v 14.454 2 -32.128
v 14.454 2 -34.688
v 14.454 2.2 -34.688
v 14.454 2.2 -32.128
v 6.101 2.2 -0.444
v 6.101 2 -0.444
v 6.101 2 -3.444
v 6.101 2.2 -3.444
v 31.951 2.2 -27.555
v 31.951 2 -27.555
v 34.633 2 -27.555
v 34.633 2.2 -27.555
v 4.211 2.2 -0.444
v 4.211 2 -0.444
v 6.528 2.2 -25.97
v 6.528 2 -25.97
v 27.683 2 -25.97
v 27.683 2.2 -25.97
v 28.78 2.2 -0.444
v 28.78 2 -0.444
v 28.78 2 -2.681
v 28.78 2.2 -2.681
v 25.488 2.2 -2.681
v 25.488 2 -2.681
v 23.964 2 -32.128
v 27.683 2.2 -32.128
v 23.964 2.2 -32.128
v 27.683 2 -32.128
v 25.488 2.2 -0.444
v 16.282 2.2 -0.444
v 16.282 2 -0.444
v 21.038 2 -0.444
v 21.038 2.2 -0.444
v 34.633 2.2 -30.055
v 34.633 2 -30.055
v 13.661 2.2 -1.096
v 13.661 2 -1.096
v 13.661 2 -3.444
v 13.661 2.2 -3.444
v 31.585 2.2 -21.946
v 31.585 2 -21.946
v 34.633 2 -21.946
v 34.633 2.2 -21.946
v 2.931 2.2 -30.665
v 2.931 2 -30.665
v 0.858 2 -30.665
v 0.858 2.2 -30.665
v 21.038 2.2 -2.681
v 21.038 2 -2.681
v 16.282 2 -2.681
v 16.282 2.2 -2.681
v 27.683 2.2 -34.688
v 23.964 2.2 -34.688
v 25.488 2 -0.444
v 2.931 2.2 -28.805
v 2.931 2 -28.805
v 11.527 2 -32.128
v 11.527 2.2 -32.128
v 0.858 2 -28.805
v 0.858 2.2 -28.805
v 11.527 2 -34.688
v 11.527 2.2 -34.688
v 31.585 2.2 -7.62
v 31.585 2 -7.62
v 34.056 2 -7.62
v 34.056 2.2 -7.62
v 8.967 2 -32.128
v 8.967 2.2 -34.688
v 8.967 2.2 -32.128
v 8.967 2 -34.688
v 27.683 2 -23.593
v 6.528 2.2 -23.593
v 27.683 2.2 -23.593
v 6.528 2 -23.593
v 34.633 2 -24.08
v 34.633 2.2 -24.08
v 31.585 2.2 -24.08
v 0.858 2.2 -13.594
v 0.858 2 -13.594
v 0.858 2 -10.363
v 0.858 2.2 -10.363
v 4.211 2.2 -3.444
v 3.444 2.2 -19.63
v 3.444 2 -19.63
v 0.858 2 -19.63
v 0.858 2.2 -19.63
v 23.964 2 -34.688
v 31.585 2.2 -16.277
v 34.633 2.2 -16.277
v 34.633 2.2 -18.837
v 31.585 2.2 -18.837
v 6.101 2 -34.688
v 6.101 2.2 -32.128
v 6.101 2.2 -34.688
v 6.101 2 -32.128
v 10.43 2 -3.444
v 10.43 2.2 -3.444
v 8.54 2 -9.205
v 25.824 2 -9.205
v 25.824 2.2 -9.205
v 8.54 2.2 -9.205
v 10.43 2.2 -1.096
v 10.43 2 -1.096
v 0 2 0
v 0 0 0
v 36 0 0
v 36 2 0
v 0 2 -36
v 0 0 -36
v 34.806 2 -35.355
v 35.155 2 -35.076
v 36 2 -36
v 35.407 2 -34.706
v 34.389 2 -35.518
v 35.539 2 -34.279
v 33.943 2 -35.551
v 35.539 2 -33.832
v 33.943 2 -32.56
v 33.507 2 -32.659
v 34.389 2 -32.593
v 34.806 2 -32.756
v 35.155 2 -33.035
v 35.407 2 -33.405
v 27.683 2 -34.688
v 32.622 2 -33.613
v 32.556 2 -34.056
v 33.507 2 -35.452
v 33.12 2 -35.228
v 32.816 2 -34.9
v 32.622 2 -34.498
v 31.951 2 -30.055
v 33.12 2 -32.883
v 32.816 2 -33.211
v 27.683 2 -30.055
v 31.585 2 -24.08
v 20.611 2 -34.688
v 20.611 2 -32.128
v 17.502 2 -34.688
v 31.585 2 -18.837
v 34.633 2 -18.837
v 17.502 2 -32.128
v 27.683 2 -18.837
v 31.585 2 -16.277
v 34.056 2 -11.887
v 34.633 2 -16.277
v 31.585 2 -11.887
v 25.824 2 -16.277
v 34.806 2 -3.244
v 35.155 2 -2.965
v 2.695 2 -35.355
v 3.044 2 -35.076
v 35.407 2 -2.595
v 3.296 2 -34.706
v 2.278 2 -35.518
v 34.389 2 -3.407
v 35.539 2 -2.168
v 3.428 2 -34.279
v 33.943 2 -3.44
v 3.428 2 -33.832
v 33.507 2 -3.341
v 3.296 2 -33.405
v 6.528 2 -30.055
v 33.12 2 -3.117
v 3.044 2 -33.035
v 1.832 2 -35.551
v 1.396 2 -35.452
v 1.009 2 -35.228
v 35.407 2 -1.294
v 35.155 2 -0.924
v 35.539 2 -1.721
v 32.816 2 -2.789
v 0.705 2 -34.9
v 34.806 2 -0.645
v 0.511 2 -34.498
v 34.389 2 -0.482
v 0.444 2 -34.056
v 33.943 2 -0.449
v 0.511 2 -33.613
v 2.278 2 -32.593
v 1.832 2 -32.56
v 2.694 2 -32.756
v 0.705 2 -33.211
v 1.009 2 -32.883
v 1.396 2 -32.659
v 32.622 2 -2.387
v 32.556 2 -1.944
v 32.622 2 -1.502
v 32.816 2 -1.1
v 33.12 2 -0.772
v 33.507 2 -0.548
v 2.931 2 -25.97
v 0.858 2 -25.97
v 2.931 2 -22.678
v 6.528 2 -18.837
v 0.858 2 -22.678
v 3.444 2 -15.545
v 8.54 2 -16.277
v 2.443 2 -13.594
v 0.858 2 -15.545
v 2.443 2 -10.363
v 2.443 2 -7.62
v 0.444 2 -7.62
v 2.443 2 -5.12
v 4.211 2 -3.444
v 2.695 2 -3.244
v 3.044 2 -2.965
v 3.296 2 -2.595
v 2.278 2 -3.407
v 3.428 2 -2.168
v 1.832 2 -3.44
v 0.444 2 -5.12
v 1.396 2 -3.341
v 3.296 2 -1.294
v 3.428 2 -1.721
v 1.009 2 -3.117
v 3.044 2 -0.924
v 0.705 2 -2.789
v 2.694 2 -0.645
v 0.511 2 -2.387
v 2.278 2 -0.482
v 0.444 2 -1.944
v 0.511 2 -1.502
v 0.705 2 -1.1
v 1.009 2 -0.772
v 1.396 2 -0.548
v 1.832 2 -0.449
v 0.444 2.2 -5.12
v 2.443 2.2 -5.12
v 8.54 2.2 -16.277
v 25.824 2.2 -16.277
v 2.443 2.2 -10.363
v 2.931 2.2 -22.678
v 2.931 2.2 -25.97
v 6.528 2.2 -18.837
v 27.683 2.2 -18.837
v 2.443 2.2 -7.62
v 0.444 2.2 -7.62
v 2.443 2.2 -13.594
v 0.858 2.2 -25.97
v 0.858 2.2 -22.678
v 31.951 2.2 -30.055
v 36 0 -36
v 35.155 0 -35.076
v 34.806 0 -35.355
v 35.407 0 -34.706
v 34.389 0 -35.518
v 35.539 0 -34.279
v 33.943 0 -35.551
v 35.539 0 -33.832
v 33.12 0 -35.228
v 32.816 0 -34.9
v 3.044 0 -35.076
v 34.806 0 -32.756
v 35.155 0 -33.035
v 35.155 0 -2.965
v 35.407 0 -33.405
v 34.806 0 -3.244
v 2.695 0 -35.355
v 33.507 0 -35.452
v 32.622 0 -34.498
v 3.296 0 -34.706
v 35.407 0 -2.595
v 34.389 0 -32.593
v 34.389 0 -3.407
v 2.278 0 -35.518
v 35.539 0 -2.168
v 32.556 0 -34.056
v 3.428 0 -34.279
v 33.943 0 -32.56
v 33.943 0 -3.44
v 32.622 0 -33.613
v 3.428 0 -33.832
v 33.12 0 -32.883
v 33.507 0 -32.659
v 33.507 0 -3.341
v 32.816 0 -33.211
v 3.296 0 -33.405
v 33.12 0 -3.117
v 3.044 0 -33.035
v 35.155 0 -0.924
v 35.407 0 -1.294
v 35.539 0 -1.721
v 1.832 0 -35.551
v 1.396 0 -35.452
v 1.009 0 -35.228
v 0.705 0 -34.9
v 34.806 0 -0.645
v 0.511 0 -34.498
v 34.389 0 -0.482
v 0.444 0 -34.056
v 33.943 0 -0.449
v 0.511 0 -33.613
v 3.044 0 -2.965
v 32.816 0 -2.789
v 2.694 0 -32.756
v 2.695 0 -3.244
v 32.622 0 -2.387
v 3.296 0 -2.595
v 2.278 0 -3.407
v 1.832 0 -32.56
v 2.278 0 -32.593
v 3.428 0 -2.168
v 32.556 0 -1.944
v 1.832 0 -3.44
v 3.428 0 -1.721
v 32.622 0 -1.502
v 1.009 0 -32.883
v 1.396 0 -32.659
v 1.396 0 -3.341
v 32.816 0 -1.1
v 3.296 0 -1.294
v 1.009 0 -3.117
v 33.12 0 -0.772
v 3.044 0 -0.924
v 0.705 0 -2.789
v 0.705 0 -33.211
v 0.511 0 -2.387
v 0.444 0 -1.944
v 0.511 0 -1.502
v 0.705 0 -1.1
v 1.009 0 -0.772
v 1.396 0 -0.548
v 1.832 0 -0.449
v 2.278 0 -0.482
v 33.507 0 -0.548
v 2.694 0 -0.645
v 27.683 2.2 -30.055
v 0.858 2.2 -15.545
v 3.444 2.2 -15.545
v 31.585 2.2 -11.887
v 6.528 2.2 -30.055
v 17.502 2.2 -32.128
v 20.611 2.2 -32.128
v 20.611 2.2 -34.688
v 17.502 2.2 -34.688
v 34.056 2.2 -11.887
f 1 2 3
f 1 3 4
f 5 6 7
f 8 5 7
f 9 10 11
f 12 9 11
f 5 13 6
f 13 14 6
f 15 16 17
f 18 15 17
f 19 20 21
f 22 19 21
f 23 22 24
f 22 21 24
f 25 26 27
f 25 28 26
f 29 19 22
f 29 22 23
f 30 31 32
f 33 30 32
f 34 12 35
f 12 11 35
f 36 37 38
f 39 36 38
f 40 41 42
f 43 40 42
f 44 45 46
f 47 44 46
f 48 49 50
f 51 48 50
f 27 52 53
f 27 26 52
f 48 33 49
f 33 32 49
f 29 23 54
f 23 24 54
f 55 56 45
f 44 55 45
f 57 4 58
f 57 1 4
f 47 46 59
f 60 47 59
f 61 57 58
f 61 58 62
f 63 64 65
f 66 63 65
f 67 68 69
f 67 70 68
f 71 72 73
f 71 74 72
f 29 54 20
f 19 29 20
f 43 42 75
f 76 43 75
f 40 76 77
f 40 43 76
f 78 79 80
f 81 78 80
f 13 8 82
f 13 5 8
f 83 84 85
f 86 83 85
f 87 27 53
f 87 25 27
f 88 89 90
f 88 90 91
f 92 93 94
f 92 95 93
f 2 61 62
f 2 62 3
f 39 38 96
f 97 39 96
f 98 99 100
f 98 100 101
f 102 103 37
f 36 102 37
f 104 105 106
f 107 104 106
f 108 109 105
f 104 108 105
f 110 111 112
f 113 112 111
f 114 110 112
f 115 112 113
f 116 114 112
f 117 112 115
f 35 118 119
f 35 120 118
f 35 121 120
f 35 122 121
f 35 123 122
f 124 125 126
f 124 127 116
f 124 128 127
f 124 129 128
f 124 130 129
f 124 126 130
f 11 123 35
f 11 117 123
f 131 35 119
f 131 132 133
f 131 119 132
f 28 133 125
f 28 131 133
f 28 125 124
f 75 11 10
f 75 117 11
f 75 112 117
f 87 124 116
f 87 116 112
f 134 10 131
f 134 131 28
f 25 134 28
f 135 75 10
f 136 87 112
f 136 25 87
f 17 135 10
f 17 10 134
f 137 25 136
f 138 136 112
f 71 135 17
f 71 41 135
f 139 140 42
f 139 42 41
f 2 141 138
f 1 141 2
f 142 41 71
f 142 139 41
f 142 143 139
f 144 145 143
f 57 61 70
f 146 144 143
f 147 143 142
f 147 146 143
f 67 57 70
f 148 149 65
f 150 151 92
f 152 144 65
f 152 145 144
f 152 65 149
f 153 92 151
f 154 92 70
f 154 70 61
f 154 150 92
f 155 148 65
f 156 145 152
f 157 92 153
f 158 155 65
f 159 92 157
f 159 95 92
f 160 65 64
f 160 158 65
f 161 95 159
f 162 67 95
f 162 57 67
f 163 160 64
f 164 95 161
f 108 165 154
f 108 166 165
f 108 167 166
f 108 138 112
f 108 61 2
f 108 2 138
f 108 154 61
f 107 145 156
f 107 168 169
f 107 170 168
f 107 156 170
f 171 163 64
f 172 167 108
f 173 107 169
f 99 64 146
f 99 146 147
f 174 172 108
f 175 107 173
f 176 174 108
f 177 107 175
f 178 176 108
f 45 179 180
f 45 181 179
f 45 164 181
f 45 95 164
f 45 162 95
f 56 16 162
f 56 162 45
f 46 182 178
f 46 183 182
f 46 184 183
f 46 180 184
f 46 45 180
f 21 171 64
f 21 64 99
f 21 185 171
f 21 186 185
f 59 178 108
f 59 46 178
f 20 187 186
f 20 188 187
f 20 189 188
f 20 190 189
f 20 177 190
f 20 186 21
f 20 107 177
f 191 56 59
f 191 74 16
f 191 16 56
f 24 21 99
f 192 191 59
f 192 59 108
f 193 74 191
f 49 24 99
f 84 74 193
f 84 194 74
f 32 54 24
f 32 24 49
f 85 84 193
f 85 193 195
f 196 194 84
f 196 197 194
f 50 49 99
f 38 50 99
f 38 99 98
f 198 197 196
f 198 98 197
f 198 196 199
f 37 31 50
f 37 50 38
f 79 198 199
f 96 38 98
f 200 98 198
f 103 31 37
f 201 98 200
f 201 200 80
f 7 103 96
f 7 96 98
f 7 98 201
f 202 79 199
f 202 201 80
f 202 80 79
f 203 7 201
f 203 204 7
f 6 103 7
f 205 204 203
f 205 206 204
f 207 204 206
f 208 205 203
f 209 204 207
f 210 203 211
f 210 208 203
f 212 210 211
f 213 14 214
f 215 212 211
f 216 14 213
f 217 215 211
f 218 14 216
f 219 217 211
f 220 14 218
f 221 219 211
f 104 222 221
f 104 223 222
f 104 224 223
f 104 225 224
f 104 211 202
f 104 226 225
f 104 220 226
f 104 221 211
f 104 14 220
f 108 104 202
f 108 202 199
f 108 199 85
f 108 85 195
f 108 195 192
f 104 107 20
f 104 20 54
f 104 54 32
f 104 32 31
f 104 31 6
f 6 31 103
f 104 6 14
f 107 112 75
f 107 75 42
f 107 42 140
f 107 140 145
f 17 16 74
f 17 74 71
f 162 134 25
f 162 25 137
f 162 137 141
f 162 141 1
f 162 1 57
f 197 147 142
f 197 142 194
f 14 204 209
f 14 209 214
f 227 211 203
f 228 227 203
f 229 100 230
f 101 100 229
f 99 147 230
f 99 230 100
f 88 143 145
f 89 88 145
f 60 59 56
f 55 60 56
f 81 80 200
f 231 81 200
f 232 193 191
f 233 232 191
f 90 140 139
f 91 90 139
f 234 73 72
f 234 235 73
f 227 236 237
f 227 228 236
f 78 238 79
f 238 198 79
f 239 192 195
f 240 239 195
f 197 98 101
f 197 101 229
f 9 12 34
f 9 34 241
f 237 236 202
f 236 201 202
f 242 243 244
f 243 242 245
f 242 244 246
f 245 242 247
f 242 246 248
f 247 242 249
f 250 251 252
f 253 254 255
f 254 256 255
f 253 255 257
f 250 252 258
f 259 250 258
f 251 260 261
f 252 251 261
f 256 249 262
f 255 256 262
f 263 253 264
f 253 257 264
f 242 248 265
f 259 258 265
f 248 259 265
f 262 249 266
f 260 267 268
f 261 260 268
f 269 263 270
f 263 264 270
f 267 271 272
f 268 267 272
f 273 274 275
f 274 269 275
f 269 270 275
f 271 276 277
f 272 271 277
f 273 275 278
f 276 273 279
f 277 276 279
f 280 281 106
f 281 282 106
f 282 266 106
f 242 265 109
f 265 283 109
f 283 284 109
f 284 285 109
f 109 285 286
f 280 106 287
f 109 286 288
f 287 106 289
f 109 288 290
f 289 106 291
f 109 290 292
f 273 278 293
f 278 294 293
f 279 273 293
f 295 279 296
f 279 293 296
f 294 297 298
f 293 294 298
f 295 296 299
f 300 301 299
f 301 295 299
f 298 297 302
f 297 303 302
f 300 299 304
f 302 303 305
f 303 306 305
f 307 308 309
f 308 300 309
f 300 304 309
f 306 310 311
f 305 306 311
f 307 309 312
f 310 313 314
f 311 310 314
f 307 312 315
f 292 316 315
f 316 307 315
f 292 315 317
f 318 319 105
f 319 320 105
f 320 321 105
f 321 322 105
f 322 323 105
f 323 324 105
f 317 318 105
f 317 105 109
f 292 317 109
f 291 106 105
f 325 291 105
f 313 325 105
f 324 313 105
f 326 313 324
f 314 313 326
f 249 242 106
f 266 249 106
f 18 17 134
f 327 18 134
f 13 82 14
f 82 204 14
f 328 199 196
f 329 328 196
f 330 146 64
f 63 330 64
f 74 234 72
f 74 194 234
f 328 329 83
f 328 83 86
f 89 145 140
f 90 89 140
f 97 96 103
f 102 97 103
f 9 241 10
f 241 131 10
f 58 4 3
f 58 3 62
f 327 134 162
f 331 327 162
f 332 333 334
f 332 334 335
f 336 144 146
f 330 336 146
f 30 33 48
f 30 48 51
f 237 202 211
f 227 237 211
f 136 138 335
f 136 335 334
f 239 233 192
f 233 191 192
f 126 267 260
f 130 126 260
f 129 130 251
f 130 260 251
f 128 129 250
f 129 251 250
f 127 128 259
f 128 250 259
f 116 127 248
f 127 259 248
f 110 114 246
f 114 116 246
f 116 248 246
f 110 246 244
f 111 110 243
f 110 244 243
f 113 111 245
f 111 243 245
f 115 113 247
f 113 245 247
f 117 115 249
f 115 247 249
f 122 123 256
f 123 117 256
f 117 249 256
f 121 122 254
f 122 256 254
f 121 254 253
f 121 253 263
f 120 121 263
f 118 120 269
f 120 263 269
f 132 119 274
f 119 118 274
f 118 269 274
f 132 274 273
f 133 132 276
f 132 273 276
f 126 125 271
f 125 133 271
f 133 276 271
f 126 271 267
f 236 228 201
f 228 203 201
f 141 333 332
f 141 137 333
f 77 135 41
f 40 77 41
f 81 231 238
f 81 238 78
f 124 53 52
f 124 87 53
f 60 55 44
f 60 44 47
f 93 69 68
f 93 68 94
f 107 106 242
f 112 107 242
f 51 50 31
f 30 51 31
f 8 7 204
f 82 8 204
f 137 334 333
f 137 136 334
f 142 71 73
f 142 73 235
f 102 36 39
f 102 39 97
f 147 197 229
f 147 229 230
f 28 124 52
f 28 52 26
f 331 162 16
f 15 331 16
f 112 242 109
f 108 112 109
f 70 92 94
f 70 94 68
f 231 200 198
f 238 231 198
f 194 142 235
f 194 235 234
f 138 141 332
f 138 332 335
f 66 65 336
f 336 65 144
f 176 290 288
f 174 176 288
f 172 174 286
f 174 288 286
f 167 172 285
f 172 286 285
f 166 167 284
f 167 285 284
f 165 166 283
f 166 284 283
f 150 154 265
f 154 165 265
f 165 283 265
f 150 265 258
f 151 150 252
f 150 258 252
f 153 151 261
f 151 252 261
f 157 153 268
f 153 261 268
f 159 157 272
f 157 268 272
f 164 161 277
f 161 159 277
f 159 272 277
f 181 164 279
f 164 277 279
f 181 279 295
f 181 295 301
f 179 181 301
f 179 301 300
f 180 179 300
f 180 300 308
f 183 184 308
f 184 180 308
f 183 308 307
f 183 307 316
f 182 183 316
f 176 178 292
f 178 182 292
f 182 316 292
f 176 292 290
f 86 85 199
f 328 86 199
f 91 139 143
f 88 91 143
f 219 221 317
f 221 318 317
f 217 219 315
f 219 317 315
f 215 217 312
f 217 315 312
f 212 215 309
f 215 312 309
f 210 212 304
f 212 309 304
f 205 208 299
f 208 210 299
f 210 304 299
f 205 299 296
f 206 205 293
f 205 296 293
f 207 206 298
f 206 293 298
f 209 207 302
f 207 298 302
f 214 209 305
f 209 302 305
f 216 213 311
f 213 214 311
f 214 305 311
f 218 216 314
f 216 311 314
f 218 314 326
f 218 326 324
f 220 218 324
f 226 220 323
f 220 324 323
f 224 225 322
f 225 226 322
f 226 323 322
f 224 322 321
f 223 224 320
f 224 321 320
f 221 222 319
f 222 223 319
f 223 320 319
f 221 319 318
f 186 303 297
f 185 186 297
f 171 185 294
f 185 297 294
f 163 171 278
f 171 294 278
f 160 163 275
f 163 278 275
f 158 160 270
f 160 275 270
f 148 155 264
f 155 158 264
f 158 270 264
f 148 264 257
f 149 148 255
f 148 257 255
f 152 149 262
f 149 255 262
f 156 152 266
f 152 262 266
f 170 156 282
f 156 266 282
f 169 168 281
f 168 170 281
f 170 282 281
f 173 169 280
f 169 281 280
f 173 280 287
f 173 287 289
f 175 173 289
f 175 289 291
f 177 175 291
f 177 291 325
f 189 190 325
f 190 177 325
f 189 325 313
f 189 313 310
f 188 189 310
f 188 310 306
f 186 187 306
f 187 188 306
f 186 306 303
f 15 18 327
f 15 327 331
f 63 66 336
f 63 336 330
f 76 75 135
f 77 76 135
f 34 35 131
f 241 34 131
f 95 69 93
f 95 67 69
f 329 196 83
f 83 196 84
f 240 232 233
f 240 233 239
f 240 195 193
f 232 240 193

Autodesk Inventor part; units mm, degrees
ref_plane "YZ Plane" through (0, 0, 0) normal (1, 0, 0) x (0, 1, 0)
ref_plane "XZ Plane" through (0, 0, 0) normal (0, 1, 0) x (-1, 0, 0)
ref_plane "XY Plane" through (0, 0, 0) normal (0, 0, 1) x (1, 0, 0)
sketch "Sketch1" plane through (0, 0, 0) normal (0, 1, 0) x (-1, 0, 0)
  line L0 (0, 0) -> (-36, 0)
  line L1 (-36, 0) -> (-36, -36)
  line L2 (-36, -36) -> (0, -36)
  line L3 (0, -36) -> (0, 0)
  circle A0 centre (-1.9445, -34.0555) radius 1.5
  circle A1 centre (-34.0555, -34.0555) radius 1.5
  circle A2 centre (-1.9445, -1.9445) radius 1.5
  circle A3 centre (-34.0555, -1.9445) radius 1.5
  line L4 (-6.1012, -34.6884) -> (-8.9666, -34.6884)
  line L5 (-8.9666, -34.6884) -> (-8.9666, -32.1278)
  line L6 (-8.9666, -32.1278) -> (-6.1012, -32.1278)
  line L7 (-6.1012, -32.1278) -> (-6.1012, -34.6884)
  line L8 (-11.5272, -34.6884) -> (-14.4536, -34.6884)
  line L9 (-14.4536, -34.6884) -> (-14.4536, -32.1278)
  line L10 (-14.4536, -32.1278) -> (-11.5272, -32.1278)
  line L11 (-11.5272, -32.1278) -> (-11.5272, -34.6884)
  line L12 (-17.5019, -34.6884) -> (-20.6111, -34.6884)
  line L13 (-20.6111, -34.6884) -> (-20.6111, -32.1278)
  line L14 (-20.6111, -32.1278) -> (-17.5019, -32.1278)
  line L15 (-17.5019, -32.1278) -> (-17.5019, -34.6884)
  line L16 (-23.9642, -34.6884) -> (-27.6831, -34.6884)
  line L17 (-27.6831, -34.6884) -> (-27.6831, -32.1278)
  line L18 (-27.6831, -32.1278) -> (-23.9642, -32.1278)
  line L19 (-23.9642, -32.1278) -> (-23.9642, -34.6884)
  line L20 (-34.6332, -30.055) -> (-31.9508, -30.055)
  line L21 (-31.9508, -30.055) -> (-31.9508, -27.5554)
  line L22 (-31.9508, -27.5554) -> (-34.6332, -27.5554)
  line L23 (-34.6332, -27.5554) -> (-34.6332, -30.055)
  line L24 (-34.6332, -24.0803) -> (-31.585, -24.0803)
  line L25 (-31.585, -24.0803) -> (-31.585, -21.9465)
  line L26 (-31.585, -21.9465) -> (-34.6332, -21.9465)
  line L27 (-34.6332, -21.9465) -> (-34.6332, -24.0803)
  line L28 (-34.6332, -18.8373) -> (-31.585, -18.8373)
  line L29 (-31.585, -18.8373) -> (-31.585, -16.2767)
  line L30 (-31.585, -16.2767) -> (-34.6332, -16.2767)
  line L31 (-34.6332, -16.2767) -> (-34.6332, -18.8373)
  line L32 (-34.0555, -11.8872) -> (-31.585, -11.8872)
  line L33 (-31.585, -11.8872) -> (-31.585, -7.6196)
  line L34 (-31.585, -7.6196) -> (-34.0555, -7.6196)
  line L35 (-34.0555, -7.6196) -> (-34.0555, -11.8872)
  line L36 (-28.7805, -2.6813) -> (-25.4884, -2.6813)
  line L37 (-25.4884, -2.6813) -> (-25.4884, -0.4445)
  line L38 (-25.4884, -0.4445) -> (-28.7805, -0.4445)
  line L39 (-28.7805, -0.4445) -> (-28.7805, -2.6813)
  line L40 (-21.0379, -2.6813) -> (-16.2825, -2.6813)
  line L41 (-16.2825, -2.6813) -> (-16.2825, -0.4445)
  line L42 (-16.2825, -0.4445) -> (-21.0379, -0.4445)
  line L43 (-21.0379, -0.4445) -> (-21.0379, -2.6813)
  line L44 (-13.661, -3.4445) -> (-10.4298, -3.4445)
  line L45 (-10.4298, -3.4445) -> (-10.4298, -1.0962)
  line L46 (-10.4298, -1.0962) -> (-13.661, -1.0962)
  line L47 (-13.661, -1.0962) -> (-13.661, -3.4445)
  line L48 (-6.1012, -3.4445) -> (-4.2113, -3.4445)
  line L49 (-4.2113, -3.4445) -> (-4.2113, -0.4445)
  line L50 (-4.2113, -0.4445) -> (-6.1012, -0.4445)
  line L51 (-6.1012, -0.4445) -> (-6.1012, -3.4445)
  line L52 (-2.4433, -7.6196) -> (-0.4445, -7.6196)
  line L53 (-0.4445, -7.6196) -> (-0.4445, -5.12)
  line L54 (-0.4445, -5.12) -> (-2.4433, -5.12)
  line L55 (-2.4433, -5.12) -> (-2.4433, -7.6196)
  line L56 (-2.4433, -13.5942) -> (-0.8582, -13.5942)
  line L57 (-0.8582, -13.5942) -> (-0.8582, -10.363)
  line L58 (-0.8582, -10.363) -> (-2.4433, -10.363)
  line L59 (-2.4433, -10.363) -> (-2.4433, -13.5942)
  line L60 (-3.4445, -19.6298) -> (-0.8582, -19.6298)
  line L61 (-0.8582, -19.6298) -> (-0.8582, -15.5451)
  line L62 (-0.8582, -15.5451) -> (-3.4445, -15.5451)
  line L63 (-3.4445, -15.5451) -> (-3.4445, -19.6298)
  line L64 (-2.931, -25.9703) -> (-0.8582, -25.9703)
  line L65 (-0.8582, -25.9703) -> (-0.8582, -22.6781)
  line L66 (-0.8582, -22.6781) -> (-2.931, -22.6781)
  line L67 (-2.931, -22.6781) -> (-2.931, -25.9703)
  line L68 (-2.931, -30.6646) -> (-0.8582, -30.6646)
  line L69 (-0.8582, -30.6646) -> (-0.8582, -28.8052)
  line L70 (-0.8582, -28.8052) -> (-2.931, -28.8052)
  line L71 (-2.931, -28.8052) -> (-2.931, -30.6646)
  line L72 (-27.6831, -30.055) -> (-6.528, -30.055)
  line L73 (-6.528, -30.055) -> (-6.528, -25.9703)
  line L74 (-6.528, -25.9703) -> (-27.6831, -25.9703)
  line L75 (-27.6831, -25.9703) -> (-27.6831, -30.055)
  line L76 (-6.528, -23.5926) -> (-27.6831, -23.5926)
  line L77 (-27.6831, -23.5926) -> (-27.6831, -18.8373)
  line L78 (-27.6831, -18.8373) -> (-6.528, -18.8373)
  line L79 (-6.528, -18.8373) -> (-6.528, -23.5926)
  line L80 (-25.8237, -9.2047) -> (-8.5399, -9.2047)
  line L81 (-8.5399, -9.2047) -> (-8.5399, -16.2767)
  line L82 (-8.5399, -16.2767) -> (-25.8237, -16.2767)
  line L83 (-25.8237, -16.2767) -> (-25.8237, -9.2047)
  dimension "d2" = 3
  dimension "d3" = 3
extrude "Extrusion1" add sketch "Sketch1" along normal blind 2 contours L3 L2 L1 L0 | L4 L5 L6 L7 | L8 L9 L10 L11 | L12 L13 L14 L15 | L16 L17 L18 L19 | L23 L22 L21 L20 | L27 L26 L25 L24 | L31 L30 L29 L28 | L35 L34 L33 L32 | L39 L38 L37 L36 | L43 L42 L41 L40 | L47 L46 L45 L44 | L51 L50 L49 L48 | L55 L54 L53 L52 | L59 L58 L57 L56 | L63 L62 L61 L60 | L67 L66 L65 L64 | L71 L70 L69 L68 | L75 L74 L73 L72 | L76 L77 L78 L79 | L80 L81 L82 L83
extrude "Extrusion2" add sketch "Sketch1" along normal blind 2.2 contours L4 L5 L6 L7 | L8 L9 L10 L11 | L12 L13 L14 L15 | L16 L17 L18 L19 | L23 L22 L21 L20 | L27 L26 L25 L24 | L31 L30 L29 L28 | L35 L34 L33 L32 | L39 L38 L37 L36 | L43 L42 L41 L40 | L47 L46 L45 L44 | L51 L50 L49 L48 | L55 L54 L53 L52 | L59 L58 L57 L56 | L63 L62 L61 L60 | L67 L66 L65 L64 | L71 L70 L69 L68 | L75 L74 L73 L72 | L76 L77 L78 L79 | L80 L81 L82 L83
properties part number "PDB 36x36"
